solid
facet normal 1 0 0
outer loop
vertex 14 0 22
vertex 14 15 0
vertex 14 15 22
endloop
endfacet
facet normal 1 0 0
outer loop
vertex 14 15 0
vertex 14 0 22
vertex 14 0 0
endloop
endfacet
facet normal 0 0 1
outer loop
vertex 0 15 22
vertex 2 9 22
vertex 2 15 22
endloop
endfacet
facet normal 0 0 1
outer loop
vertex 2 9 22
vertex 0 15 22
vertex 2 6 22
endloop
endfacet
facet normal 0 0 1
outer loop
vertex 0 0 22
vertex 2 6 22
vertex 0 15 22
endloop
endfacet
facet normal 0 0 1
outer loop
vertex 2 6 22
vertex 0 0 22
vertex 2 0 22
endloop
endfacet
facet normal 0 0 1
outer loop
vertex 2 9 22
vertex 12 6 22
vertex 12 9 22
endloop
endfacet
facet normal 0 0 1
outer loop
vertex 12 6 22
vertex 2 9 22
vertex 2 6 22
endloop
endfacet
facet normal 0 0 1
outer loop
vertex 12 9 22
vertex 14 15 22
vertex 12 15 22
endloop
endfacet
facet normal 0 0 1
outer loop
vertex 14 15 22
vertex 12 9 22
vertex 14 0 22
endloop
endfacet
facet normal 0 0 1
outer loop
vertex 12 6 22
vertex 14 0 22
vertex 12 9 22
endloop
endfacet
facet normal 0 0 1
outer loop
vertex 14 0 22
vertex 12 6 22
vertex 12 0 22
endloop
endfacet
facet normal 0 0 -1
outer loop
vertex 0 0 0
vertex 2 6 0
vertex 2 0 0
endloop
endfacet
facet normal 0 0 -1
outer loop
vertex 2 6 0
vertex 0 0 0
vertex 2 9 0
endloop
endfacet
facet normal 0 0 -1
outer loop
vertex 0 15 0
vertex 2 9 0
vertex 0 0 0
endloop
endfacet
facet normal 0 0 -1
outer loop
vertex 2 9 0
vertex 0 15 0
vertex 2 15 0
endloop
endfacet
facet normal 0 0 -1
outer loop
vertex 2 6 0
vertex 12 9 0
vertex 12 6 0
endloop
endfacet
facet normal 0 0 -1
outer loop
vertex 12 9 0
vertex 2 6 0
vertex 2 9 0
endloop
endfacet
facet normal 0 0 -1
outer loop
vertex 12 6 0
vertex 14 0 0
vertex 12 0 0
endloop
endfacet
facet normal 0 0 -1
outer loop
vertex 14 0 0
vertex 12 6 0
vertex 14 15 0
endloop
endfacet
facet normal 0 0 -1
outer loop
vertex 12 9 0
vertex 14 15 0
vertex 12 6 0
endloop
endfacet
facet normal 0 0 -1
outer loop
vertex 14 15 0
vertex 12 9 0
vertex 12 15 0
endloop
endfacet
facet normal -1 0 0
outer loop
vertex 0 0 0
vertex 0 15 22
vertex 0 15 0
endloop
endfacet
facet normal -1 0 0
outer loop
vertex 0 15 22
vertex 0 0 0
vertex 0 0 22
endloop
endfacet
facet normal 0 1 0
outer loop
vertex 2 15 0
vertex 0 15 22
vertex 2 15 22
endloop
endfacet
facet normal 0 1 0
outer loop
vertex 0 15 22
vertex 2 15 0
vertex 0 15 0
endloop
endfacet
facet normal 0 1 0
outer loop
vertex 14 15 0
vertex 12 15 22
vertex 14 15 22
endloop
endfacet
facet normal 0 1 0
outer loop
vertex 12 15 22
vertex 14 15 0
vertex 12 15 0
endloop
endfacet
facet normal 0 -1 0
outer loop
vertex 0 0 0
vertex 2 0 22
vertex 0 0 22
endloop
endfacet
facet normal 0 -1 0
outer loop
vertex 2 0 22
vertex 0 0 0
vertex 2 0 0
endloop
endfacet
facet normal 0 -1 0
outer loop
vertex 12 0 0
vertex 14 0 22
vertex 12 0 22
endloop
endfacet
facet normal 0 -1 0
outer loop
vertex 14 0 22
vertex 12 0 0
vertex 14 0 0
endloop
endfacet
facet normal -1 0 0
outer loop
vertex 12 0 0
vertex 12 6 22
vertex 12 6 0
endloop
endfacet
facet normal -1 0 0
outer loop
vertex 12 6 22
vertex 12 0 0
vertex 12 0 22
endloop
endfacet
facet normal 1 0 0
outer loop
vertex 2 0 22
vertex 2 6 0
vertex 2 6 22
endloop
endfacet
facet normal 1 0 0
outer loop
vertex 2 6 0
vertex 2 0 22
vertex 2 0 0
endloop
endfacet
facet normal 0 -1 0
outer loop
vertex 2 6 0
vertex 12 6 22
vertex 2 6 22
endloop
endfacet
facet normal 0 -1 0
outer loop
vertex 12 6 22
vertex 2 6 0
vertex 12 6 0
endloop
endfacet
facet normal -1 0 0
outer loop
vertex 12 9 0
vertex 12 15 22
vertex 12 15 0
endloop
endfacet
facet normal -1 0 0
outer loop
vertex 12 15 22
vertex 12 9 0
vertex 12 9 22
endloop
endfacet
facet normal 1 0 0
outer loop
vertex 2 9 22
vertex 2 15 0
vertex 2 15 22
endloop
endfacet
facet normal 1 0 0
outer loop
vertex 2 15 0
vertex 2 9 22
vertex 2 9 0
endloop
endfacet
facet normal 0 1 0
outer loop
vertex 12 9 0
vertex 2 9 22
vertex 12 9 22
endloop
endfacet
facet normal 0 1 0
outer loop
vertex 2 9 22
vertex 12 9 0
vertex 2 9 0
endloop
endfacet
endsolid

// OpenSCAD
difference()
{
  cube([14,15,22]);
  translate([2,-1,-1]) cube([10,7,25]);
  translate([2,9,-1]) cube([10,7,25]);
}
